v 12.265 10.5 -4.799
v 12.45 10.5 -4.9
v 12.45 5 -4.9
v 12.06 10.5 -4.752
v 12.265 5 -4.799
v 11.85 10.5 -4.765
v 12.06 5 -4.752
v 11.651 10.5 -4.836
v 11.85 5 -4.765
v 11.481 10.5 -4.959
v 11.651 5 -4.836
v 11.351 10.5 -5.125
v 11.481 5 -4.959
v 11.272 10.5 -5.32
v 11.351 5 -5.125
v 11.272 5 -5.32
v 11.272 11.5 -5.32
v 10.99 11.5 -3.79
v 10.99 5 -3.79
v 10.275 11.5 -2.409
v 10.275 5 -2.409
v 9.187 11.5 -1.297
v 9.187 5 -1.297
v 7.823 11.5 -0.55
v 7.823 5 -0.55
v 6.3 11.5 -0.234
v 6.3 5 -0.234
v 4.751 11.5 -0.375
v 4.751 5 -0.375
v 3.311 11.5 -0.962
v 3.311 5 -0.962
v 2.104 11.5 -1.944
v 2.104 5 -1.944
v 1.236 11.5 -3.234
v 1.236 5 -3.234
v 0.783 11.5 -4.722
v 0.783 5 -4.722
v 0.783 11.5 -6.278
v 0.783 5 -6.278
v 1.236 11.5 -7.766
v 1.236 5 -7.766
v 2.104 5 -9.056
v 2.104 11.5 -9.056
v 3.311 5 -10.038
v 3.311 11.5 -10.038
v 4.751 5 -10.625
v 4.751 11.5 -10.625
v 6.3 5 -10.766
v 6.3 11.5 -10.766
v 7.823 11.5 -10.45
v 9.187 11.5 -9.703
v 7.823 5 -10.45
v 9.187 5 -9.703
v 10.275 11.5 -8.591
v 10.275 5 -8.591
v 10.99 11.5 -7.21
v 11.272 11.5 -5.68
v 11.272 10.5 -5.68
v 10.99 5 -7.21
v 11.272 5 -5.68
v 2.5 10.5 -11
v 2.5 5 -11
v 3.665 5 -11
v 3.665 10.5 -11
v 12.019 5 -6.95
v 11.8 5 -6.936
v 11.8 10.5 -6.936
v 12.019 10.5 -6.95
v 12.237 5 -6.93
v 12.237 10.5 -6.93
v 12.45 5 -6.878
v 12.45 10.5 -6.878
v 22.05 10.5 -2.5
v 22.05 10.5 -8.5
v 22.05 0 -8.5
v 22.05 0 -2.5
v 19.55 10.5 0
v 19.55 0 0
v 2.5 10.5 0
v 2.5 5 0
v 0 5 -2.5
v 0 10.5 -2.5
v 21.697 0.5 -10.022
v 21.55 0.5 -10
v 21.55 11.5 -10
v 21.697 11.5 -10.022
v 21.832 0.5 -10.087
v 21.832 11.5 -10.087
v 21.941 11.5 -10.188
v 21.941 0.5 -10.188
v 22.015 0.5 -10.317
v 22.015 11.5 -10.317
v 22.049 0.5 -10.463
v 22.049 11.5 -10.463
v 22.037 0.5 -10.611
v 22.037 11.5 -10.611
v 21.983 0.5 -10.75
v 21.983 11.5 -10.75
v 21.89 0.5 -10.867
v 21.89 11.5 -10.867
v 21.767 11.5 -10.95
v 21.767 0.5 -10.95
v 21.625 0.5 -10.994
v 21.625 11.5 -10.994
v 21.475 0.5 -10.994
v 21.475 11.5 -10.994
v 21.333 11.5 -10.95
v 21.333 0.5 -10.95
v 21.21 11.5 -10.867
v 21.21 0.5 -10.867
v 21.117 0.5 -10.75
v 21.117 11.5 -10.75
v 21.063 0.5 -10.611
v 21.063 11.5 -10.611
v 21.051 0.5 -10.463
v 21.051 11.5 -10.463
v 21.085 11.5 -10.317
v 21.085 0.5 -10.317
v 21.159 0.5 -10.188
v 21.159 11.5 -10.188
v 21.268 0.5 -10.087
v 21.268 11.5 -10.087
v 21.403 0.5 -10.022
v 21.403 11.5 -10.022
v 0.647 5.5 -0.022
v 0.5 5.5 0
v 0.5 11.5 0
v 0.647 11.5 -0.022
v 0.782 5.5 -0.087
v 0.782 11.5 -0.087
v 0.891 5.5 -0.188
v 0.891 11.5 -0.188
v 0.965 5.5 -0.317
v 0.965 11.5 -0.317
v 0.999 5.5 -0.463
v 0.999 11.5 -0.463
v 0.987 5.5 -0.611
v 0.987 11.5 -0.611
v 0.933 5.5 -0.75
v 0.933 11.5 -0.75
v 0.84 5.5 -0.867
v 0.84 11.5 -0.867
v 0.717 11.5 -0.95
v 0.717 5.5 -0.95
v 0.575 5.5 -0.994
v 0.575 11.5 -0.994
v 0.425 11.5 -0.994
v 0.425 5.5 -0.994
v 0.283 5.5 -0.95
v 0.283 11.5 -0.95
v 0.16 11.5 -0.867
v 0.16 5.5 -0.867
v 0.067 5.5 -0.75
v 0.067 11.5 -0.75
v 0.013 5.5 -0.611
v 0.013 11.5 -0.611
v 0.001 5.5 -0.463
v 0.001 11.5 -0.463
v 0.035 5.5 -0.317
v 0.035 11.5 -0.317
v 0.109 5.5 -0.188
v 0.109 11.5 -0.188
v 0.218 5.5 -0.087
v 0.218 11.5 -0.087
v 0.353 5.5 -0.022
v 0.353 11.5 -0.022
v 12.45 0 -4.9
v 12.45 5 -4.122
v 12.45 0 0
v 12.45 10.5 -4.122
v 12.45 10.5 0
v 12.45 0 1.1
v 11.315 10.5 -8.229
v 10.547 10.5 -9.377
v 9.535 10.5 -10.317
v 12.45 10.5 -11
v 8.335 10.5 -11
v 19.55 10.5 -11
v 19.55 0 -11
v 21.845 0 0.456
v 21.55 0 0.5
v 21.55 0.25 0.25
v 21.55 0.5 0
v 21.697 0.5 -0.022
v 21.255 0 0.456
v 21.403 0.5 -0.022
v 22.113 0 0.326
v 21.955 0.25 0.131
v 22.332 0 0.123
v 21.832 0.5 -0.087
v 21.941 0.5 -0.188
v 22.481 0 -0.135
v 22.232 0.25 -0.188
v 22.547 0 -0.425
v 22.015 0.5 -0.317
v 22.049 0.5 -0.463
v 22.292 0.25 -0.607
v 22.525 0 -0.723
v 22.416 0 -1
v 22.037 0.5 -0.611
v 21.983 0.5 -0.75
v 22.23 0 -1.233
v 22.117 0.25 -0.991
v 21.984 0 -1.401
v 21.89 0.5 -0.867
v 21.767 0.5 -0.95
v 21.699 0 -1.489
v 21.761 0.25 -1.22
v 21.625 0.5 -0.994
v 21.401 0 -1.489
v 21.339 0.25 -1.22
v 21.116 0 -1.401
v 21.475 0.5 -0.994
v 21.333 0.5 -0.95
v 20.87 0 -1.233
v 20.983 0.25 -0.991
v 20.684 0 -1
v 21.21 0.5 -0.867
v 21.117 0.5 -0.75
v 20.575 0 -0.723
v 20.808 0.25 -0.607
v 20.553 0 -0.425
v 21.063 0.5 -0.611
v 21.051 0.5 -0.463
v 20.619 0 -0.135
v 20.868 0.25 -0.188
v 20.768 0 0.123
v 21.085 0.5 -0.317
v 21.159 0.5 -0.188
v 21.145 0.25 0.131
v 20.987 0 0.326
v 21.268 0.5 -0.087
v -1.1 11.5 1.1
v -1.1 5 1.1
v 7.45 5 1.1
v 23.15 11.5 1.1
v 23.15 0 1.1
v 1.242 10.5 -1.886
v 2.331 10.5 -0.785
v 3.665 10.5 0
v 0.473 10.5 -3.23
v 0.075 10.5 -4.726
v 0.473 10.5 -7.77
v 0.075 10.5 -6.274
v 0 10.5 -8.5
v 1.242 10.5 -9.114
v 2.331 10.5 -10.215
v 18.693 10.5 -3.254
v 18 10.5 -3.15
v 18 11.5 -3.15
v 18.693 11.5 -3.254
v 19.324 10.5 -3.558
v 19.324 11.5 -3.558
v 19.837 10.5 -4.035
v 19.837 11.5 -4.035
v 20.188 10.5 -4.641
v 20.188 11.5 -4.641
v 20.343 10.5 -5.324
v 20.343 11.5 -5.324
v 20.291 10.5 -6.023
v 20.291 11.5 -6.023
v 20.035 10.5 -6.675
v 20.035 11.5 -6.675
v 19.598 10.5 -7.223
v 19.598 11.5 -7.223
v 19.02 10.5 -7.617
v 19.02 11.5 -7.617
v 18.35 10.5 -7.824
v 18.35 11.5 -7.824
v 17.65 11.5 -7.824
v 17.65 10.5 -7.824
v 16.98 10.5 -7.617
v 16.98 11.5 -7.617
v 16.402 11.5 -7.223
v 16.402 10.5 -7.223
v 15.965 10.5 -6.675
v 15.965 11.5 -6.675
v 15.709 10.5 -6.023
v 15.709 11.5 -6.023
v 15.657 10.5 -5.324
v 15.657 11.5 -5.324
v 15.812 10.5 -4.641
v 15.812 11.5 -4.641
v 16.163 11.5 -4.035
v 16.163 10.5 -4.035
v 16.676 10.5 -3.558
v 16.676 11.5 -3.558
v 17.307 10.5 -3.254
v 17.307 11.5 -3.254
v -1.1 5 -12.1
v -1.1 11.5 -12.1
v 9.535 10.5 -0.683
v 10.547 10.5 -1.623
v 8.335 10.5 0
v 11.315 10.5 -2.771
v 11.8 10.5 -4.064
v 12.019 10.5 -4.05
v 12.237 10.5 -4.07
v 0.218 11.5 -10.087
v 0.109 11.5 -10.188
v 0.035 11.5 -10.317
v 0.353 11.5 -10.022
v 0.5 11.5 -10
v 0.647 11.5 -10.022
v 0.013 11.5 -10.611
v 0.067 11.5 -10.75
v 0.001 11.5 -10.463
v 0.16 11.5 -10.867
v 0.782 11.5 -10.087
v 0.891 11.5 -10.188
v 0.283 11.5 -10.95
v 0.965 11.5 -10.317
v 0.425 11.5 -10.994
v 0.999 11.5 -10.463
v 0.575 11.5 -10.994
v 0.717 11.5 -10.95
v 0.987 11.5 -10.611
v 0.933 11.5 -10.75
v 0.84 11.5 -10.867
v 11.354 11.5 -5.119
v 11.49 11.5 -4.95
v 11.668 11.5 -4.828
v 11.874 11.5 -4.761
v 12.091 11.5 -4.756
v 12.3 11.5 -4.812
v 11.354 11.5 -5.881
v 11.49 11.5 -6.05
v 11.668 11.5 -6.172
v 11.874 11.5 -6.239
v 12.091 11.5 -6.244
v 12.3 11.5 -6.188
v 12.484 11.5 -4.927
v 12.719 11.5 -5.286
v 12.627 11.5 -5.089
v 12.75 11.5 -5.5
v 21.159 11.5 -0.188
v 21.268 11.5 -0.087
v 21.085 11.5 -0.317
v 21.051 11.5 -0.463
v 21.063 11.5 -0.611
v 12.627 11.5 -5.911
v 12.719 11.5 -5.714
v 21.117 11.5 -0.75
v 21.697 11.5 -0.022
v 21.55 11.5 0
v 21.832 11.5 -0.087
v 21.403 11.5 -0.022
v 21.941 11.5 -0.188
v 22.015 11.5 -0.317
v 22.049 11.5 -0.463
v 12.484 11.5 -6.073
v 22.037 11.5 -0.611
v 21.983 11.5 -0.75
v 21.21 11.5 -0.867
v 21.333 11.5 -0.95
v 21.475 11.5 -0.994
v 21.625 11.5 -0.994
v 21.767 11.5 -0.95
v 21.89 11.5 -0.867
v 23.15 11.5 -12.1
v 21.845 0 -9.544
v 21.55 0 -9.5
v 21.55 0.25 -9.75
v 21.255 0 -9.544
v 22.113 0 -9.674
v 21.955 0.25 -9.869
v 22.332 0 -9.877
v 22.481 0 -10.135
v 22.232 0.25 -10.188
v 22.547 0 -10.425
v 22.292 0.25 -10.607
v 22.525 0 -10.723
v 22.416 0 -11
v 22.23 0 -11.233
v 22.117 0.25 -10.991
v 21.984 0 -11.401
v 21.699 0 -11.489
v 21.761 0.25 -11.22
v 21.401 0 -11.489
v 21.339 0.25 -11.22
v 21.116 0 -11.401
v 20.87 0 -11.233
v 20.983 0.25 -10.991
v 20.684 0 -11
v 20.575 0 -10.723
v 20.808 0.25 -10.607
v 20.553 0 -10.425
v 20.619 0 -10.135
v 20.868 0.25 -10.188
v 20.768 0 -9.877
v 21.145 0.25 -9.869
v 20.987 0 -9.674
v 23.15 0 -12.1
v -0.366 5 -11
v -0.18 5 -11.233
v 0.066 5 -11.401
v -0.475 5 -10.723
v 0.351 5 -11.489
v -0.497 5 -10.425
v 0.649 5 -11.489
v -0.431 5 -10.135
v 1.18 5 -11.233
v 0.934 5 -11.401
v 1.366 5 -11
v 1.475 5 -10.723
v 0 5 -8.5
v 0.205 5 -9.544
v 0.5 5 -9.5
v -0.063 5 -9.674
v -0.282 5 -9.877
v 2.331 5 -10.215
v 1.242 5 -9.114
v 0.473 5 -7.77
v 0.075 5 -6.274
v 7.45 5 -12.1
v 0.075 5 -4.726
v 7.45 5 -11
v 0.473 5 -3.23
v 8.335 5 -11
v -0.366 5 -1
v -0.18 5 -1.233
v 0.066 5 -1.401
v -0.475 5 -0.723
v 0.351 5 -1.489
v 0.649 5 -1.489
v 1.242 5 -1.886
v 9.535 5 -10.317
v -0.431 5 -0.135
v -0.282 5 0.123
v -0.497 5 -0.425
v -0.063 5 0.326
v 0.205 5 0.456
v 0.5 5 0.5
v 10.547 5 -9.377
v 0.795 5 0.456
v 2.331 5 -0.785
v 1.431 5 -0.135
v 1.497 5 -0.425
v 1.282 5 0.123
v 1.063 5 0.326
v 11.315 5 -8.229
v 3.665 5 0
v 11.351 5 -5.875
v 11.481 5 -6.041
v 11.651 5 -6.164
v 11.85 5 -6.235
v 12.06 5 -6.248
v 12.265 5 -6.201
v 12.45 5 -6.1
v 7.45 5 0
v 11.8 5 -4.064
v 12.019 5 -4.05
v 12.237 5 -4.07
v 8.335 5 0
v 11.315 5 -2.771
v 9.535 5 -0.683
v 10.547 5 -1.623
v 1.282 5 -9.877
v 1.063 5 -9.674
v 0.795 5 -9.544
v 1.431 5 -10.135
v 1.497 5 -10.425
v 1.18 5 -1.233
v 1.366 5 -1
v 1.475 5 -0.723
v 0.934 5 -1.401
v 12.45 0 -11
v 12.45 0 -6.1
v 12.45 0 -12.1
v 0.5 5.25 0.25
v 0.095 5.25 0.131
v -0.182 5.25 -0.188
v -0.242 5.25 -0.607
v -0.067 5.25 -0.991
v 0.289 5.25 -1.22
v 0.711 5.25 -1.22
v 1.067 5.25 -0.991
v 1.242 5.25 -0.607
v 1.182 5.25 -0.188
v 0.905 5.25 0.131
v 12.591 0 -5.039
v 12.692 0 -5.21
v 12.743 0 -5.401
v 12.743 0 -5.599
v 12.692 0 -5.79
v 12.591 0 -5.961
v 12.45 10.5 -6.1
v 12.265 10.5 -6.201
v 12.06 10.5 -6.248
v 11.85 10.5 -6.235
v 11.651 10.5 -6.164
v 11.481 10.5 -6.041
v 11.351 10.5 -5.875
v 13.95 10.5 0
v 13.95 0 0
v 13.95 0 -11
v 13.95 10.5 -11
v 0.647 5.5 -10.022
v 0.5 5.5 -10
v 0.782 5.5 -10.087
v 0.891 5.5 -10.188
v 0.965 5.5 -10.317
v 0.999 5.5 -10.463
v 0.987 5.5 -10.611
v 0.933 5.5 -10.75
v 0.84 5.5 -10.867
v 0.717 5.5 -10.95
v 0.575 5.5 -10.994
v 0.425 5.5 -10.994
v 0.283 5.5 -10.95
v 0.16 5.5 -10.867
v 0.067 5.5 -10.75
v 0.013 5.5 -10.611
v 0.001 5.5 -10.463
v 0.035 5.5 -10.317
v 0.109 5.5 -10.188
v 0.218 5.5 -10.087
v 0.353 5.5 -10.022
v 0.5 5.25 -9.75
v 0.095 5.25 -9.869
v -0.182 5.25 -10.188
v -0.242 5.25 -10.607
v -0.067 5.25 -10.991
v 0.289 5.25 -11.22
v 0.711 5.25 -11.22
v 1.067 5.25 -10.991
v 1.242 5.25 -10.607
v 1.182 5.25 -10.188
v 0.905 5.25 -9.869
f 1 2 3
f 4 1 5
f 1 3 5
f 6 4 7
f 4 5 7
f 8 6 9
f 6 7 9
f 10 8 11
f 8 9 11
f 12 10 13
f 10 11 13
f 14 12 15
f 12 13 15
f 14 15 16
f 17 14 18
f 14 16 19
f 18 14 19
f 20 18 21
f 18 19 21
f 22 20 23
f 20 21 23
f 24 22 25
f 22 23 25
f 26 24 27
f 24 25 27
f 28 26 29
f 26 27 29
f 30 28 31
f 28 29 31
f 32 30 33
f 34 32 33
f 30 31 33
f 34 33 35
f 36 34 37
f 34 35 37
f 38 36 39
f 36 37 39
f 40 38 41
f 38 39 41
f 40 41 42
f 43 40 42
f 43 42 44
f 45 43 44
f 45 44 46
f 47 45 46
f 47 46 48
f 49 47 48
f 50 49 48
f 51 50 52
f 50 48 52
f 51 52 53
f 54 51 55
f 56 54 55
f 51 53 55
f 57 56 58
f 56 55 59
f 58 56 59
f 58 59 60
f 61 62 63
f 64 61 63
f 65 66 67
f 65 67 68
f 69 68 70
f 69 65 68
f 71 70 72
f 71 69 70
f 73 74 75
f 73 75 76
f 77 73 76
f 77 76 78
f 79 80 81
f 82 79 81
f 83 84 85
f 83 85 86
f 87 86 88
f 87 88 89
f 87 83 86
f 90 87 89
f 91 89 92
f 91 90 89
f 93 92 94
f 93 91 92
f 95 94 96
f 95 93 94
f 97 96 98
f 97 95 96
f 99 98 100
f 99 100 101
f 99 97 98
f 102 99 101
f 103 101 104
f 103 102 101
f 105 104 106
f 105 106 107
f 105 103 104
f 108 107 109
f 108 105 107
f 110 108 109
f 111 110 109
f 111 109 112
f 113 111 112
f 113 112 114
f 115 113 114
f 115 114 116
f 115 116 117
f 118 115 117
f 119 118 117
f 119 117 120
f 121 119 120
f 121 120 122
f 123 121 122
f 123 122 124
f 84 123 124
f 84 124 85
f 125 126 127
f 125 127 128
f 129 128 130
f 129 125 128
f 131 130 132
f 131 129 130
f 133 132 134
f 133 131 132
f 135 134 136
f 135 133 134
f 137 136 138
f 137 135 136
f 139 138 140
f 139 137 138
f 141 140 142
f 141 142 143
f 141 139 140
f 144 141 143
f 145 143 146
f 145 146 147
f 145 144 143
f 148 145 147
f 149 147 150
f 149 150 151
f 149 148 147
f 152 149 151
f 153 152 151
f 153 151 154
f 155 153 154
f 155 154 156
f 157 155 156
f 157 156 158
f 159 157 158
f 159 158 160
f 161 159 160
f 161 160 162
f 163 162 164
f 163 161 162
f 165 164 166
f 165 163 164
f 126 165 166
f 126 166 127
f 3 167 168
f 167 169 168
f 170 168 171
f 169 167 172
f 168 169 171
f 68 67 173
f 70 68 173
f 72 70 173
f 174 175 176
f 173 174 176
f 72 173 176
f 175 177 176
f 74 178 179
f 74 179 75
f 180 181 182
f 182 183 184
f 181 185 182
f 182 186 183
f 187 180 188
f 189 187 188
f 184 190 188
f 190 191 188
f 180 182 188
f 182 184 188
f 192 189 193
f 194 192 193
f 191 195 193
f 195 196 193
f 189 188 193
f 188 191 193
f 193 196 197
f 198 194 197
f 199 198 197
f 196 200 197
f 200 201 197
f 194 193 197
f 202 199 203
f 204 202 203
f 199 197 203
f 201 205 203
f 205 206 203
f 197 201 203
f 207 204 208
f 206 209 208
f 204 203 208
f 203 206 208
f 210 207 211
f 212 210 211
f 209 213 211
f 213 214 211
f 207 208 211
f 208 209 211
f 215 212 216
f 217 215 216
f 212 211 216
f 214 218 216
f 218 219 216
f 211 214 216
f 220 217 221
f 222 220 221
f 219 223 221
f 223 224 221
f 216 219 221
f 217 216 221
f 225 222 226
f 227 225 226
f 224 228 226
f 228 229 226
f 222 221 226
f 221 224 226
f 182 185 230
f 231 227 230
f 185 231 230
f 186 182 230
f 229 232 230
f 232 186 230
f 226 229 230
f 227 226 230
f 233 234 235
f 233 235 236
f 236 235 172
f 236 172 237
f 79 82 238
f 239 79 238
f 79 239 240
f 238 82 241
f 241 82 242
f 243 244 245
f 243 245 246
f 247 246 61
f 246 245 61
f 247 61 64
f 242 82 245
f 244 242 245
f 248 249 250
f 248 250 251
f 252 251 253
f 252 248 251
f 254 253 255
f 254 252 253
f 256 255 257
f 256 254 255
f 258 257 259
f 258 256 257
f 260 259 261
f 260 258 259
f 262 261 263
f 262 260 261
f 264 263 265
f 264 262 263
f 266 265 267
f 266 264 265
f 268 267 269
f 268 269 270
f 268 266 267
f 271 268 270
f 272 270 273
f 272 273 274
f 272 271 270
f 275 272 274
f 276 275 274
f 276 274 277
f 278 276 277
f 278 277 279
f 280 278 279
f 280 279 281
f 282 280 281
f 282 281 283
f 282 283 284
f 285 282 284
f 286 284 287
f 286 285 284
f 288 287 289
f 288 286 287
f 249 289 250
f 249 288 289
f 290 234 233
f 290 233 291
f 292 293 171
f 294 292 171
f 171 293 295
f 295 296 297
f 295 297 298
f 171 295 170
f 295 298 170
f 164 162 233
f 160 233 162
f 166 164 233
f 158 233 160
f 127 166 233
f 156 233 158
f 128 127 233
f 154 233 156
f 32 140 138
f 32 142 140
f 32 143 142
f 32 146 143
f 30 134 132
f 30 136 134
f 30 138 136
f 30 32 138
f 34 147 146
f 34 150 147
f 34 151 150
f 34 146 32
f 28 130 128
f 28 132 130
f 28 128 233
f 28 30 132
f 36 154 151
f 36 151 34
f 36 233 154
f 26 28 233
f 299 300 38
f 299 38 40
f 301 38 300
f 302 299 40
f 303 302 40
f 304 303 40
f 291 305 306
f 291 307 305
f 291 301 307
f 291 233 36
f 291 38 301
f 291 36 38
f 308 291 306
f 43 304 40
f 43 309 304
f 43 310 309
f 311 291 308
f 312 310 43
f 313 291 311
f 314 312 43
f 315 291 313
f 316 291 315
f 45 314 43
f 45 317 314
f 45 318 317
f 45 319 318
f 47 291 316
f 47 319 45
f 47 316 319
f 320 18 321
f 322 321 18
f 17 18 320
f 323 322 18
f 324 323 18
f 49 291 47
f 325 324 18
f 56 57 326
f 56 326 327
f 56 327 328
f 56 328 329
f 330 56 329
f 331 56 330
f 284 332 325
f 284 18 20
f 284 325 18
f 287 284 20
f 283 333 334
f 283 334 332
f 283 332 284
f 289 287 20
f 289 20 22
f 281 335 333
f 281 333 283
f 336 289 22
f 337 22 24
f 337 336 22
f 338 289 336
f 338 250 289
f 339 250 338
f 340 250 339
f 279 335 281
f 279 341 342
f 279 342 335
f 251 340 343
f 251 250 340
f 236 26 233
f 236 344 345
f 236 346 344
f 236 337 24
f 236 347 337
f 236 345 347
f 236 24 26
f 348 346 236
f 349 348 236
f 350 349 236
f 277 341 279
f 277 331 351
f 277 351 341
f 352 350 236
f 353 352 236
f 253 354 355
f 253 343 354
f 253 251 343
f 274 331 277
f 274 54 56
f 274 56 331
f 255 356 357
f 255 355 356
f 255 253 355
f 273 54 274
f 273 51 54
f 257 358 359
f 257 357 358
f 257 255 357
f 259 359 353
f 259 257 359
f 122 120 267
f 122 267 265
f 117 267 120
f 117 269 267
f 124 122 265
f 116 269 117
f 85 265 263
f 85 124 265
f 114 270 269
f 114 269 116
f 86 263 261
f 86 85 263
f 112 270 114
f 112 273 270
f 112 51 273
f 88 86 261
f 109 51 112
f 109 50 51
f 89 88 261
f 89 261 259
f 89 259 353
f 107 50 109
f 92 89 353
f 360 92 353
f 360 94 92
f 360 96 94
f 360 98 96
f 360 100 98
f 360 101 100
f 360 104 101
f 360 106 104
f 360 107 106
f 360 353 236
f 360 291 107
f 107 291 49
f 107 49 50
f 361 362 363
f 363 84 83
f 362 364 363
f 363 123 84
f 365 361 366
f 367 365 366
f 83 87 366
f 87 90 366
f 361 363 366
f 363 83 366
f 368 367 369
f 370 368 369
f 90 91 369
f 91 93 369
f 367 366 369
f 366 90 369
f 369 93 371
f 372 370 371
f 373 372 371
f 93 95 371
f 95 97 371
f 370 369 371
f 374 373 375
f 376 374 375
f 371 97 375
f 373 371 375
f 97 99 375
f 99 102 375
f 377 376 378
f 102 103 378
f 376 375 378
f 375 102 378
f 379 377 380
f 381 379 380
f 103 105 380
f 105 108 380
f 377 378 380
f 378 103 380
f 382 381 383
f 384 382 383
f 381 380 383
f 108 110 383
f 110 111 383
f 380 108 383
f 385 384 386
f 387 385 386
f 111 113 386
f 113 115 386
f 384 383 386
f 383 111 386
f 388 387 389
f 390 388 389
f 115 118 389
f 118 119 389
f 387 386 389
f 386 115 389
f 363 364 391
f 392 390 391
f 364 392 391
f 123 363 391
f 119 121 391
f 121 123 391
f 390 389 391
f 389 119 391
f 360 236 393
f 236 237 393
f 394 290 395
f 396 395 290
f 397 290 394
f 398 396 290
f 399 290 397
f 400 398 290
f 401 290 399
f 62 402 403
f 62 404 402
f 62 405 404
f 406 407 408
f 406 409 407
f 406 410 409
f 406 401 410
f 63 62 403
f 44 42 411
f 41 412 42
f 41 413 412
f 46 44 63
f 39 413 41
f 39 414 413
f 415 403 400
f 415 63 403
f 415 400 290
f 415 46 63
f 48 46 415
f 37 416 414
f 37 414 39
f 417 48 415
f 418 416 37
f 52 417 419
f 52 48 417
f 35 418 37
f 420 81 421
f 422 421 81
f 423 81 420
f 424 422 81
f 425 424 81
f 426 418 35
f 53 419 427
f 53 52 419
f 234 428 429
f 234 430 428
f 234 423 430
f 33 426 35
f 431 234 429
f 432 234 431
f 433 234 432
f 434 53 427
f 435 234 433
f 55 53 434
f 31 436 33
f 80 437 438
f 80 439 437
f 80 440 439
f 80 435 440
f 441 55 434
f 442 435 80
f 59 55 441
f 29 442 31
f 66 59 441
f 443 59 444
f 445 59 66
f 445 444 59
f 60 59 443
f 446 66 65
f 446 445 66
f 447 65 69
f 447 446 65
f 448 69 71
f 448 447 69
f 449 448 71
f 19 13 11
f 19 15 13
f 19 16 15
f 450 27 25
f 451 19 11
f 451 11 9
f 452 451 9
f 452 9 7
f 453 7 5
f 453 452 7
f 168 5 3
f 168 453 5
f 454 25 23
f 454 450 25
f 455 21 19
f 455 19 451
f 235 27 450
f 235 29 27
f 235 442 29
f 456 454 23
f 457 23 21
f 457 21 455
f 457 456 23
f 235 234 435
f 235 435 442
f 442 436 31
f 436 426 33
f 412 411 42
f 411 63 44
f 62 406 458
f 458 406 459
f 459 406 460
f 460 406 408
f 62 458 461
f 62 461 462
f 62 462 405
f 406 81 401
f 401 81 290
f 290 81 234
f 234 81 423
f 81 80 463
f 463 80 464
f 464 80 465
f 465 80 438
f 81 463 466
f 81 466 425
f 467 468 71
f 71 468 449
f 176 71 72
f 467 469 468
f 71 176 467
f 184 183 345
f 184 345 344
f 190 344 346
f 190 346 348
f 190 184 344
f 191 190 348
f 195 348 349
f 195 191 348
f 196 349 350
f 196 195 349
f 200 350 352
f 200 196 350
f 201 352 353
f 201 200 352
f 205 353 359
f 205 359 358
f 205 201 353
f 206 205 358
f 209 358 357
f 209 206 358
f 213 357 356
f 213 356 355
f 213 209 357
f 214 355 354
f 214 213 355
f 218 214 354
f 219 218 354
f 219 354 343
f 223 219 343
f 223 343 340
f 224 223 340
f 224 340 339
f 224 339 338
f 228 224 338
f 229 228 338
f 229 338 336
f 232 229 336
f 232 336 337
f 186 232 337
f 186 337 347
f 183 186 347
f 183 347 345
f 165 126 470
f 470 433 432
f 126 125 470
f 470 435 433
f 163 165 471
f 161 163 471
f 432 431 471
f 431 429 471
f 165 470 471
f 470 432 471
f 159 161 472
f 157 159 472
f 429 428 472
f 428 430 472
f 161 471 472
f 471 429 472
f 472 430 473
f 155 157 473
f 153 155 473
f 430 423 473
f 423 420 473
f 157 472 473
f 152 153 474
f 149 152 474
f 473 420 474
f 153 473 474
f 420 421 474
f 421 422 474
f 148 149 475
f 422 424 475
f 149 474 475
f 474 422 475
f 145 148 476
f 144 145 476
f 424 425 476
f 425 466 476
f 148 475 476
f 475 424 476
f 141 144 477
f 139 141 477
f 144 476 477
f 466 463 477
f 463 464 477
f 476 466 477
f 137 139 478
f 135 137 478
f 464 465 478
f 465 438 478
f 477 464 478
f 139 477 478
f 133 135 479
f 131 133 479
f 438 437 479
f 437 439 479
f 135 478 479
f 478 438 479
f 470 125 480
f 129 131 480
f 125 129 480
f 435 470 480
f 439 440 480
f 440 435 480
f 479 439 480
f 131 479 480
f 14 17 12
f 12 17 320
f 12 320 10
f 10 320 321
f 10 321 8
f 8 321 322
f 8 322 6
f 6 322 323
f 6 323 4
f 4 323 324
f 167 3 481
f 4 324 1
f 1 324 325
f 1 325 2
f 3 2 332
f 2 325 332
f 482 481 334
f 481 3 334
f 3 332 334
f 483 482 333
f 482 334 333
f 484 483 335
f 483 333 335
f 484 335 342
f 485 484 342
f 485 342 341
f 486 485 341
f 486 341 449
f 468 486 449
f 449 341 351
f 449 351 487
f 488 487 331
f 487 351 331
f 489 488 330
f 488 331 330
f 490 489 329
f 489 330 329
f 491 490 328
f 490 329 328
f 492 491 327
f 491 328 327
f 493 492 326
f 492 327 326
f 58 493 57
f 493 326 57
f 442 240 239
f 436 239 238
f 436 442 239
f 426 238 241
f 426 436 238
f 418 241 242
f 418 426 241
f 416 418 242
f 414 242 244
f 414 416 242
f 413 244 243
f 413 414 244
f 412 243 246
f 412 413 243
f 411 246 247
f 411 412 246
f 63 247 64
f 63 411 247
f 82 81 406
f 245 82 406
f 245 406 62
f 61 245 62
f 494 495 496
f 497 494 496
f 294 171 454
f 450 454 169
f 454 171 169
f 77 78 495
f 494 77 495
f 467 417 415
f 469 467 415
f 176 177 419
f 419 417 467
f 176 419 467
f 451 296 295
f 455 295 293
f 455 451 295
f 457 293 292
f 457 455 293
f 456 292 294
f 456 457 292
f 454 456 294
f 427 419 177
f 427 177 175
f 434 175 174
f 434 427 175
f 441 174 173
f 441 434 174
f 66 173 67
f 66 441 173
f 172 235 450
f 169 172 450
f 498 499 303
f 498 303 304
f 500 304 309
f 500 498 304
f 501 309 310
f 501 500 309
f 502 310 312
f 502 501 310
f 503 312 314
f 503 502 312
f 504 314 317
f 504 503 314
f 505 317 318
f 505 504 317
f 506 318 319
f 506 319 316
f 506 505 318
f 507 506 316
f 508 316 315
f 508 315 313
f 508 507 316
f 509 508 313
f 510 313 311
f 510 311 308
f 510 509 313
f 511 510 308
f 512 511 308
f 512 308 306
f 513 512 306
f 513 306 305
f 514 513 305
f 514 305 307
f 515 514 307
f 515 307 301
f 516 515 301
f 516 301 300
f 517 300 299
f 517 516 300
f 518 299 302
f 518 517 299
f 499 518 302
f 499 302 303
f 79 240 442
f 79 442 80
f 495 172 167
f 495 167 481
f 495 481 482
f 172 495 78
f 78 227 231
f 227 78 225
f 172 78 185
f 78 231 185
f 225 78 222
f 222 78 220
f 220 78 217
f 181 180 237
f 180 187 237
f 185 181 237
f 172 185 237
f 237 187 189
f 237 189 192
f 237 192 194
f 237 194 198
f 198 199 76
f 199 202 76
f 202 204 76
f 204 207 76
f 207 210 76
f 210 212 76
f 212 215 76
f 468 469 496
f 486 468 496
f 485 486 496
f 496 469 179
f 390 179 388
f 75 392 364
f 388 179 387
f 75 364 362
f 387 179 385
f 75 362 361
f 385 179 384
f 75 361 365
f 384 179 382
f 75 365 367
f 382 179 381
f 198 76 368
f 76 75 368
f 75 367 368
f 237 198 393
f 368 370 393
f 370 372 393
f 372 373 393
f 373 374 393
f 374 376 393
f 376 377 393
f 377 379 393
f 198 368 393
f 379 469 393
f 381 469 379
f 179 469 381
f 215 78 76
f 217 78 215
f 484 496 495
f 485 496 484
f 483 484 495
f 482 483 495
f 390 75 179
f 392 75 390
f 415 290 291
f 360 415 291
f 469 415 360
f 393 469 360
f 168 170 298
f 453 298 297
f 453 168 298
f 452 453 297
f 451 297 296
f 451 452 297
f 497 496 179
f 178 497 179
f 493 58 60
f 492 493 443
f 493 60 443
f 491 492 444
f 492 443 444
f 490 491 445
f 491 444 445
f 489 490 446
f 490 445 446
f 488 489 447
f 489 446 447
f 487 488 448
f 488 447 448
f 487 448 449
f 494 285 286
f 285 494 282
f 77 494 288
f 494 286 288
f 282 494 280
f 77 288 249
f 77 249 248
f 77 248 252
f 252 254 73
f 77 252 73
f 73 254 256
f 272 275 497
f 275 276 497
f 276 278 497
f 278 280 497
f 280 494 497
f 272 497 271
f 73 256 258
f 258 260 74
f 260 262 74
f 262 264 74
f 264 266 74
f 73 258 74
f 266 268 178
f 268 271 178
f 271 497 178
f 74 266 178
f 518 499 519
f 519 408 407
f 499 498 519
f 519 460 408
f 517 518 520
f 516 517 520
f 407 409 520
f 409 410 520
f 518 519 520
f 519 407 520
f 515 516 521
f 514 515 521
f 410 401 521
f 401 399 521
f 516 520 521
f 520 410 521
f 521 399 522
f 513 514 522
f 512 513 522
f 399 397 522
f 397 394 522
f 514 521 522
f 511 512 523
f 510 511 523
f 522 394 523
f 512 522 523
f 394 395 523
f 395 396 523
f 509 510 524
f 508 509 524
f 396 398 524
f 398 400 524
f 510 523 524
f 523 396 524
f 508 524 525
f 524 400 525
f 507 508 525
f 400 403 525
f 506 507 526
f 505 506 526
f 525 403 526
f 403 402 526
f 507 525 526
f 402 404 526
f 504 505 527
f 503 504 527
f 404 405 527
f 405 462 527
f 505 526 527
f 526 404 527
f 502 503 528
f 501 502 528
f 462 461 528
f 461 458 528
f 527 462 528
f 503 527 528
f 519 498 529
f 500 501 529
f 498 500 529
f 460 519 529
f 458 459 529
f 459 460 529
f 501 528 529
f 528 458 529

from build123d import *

# Parameters (mm, degrees)
ESQUISSE2_W             = 24.25
ESQUISSE2_H             = 13.2
ESQUISSE2_R             = 0.5
BOSS_EXTRU_1_DEPTH      = 10.5
ESQUISSE3_W             = 24.25
ESQUISSE3_H             = 13.2
ESQUISSE3_R             = 0.5
ESQUISSE3_R_2           = 2.35
BOSS_EXTRU_2_DEPTH      = 1
ESQUISSE4_W             = 13.55
ESQUISSE4_H             = 5
ENL_V_MAT_EXTRU_1_DEPTH = 30.024343231
CHANFREIN1_SIZE         = 5
BOSS_EXTRU_3_START      = 5.5
BOSS_EXTRU_3_DEPTH      = 5.5
ESQUISSE6_R             = 0.75
ENL_V_MAT_EXTRU_2_DEPTH = 29.540891717
CHANFREIN2_SIZE         = 0.5


with BuildPart() as part:
    # Esquisse2 → Boss.-Extru.1 (new body)
    with BuildSketch(Plane(origin=(0, 0, 0), x_dir=(1, 0, 0), z_dir=(0, 1, 0))):
        with Locations((11.025, 5.5)):
            Rectangle(ESQUISSE2_W, ESQUISSE2_H)
        Polygon((0, 8.5), (2.5, 11), (12.45, 11), (12.45, 0), (2.5, 0), (0, 2.5), align=None, mode=Mode.SUBTRACT)
        with Locations(Location((0.5, 10.5, 0), (0, 0, 270))):
            Circle(ESQUISSE2_R, mode=Mode.SUBTRACT)
        Polygon((19.55, 0), (13.95, 0), (13.95, 11), (19.55, 11), (22.05, 8.5), (22.05, 2.5), align=None, mode=Mode.SUBTRACT)
        with Locations(Location((0.5, 0.5, 0), (0, 0, 270))):
            Circle(ESQUISSE2_R, mode=Mode.SUBTRACT)
        with Locations(Location((21.55, 0.5, 0), (0, 0, 270))):
            Circle(ESQUISSE2_R, mode=Mode.SUBTRACT)
        with Locations(Location((21.55, 10.5, 0), (0, 0, 270))):
            Circle(ESQUISSE2_R, mode=Mode.SUBTRACT)
    extrude(amount=BOSS_EXTRU_1_DEPTH)

    # Esquisse3 → Boss.-Extru.2 (add)
    with BuildSketch(Plane(origin=(0, 10.5, 0), x_dir=(1, 0, 0), z_dir=(0, 1, 0))):
        with Locations((11.025, 5.5)):
            Rectangle(ESQUISSE3_W, ESQUISSE3_H)
        with Locations(Location((0.5, 0.5, 0), (0, 0, 270))):
            Circle(ESQUISSE3_R, mode=Mode.SUBTRACT)
        with Locations(Location((21.55, 0.5, 0), (0, 0, 270))):
            Circle(ESQUISSE3_R, mode=Mode.SUBTRACT)
        with BuildLine():
            ThreePointArc((11.271927083, 5.319972702), (0.725, 5.5), (11.271927083, 5.680027298))
            ThreePointArc((11.271927083, 5.680027298), (12.090678863, 6.244498048), (12.75, 5.5))
            ThreePointArc((12.75, 5.5), (12.090678863, 4.755501952), (11.271927083, 5.319972702))
        make_face(mode=Mode.SUBTRACT)
        with Locations(Location((0.5, 10.5, 0), (0, 0, 270))):
            Circle(ESQUISSE3_R, mode=Mode.SUBTRACT)
        with Locations(Location((18, 5.5, 0), (0, 0, 270))):
            Circle(ESQUISSE3_R_2, mode=Mode.SUBTRACT)
        with Locations(Location((21.55, 10.5, 0), (0, 0, 270))):
            Circle(ESQUISSE3_R, mode=Mode.SUBTRACT)
    extrude(amount=BOSS_EXTRU_2_DEPTH)

    # Esquisse4 → Enlèv. mat.-Extru.1 (cut, through all)
    with BuildSketch(Plane.XY.offset(1.1)):
        with Locations((5.675, 2.5)):
            Rectangle(ESQUISSE4_W, ESQUISSE4_H)
    extrude(amount=-ENL_V_MAT_EXTRU_1_DEPTH, mode=Mode.SUBTRACT)

    # Chanfrein1
    chanfrein1_edges = [part.edges().sort_by_distance(p)[0] for p in [
        (12.45, 5, -11.55),
        (12.45, 5, 0.55),
    ]]
    chamfer(chanfrein1_edges, length=CHANFREIN1_SIZE - 0.0001)  # a hair under: the kernel refuses the full size

    # Esquisse5 → Boss.-Extru.3 (add)
    with BuildSketch(Plane.XZ.offset(-10.5).offset(BOSS_EXTRU_3_START)):
        with BuildLine():
            ThreePointArc((11.79984375, -6.936118893), (13.45, -5.5), (11.79984375, -4.063881107))
            ThreePointArc((11.79984375, -4.063881107), (0.025, -5.5), (11.79984375, -6.936118893))
        make_face()
        with BuildLine():
            ThreePointArc((11.271927083, -5.319972702), (0.725, -5.5), (11.271927083, -5.680027298))
            ThreePointArc((11.271927083, -5.680027298), (12.75, -5.5), (11.271927083, -5.319972702))
        make_face(mode=Mode.SUBTRACT)
    extrude(amount=-BOSS_EXTRU_3_DEPTH)

    # Esquisse6 → Enlèv. mat.-Extru.2 (cut, through all)
    with BuildSketch(Plane(origin=(0, 11.5, 0), x_dir=(1, 0, 0), z_dir=(0, 1, 0))):
        with Locations((12, 5.5)):
            Circle(ESQUISSE6_R)
    extrude(amount=-ENL_V_MAT_EXTRU_2_DEPTH, mode=Mode.SUBTRACT)

    # Chanfrein2
    chanfrein2_edges = [part.edges().sort_by_distance(p)[0] for p in [
        (0.5, 5, -1),
        (0.5, 5, -11),
        (21.55, 0, -1),
        (21.55, 0, -11),
    ]]
    chamfer(chanfrein2_edges, length=CHANFREIN2_SIZE)


solid = part.part
